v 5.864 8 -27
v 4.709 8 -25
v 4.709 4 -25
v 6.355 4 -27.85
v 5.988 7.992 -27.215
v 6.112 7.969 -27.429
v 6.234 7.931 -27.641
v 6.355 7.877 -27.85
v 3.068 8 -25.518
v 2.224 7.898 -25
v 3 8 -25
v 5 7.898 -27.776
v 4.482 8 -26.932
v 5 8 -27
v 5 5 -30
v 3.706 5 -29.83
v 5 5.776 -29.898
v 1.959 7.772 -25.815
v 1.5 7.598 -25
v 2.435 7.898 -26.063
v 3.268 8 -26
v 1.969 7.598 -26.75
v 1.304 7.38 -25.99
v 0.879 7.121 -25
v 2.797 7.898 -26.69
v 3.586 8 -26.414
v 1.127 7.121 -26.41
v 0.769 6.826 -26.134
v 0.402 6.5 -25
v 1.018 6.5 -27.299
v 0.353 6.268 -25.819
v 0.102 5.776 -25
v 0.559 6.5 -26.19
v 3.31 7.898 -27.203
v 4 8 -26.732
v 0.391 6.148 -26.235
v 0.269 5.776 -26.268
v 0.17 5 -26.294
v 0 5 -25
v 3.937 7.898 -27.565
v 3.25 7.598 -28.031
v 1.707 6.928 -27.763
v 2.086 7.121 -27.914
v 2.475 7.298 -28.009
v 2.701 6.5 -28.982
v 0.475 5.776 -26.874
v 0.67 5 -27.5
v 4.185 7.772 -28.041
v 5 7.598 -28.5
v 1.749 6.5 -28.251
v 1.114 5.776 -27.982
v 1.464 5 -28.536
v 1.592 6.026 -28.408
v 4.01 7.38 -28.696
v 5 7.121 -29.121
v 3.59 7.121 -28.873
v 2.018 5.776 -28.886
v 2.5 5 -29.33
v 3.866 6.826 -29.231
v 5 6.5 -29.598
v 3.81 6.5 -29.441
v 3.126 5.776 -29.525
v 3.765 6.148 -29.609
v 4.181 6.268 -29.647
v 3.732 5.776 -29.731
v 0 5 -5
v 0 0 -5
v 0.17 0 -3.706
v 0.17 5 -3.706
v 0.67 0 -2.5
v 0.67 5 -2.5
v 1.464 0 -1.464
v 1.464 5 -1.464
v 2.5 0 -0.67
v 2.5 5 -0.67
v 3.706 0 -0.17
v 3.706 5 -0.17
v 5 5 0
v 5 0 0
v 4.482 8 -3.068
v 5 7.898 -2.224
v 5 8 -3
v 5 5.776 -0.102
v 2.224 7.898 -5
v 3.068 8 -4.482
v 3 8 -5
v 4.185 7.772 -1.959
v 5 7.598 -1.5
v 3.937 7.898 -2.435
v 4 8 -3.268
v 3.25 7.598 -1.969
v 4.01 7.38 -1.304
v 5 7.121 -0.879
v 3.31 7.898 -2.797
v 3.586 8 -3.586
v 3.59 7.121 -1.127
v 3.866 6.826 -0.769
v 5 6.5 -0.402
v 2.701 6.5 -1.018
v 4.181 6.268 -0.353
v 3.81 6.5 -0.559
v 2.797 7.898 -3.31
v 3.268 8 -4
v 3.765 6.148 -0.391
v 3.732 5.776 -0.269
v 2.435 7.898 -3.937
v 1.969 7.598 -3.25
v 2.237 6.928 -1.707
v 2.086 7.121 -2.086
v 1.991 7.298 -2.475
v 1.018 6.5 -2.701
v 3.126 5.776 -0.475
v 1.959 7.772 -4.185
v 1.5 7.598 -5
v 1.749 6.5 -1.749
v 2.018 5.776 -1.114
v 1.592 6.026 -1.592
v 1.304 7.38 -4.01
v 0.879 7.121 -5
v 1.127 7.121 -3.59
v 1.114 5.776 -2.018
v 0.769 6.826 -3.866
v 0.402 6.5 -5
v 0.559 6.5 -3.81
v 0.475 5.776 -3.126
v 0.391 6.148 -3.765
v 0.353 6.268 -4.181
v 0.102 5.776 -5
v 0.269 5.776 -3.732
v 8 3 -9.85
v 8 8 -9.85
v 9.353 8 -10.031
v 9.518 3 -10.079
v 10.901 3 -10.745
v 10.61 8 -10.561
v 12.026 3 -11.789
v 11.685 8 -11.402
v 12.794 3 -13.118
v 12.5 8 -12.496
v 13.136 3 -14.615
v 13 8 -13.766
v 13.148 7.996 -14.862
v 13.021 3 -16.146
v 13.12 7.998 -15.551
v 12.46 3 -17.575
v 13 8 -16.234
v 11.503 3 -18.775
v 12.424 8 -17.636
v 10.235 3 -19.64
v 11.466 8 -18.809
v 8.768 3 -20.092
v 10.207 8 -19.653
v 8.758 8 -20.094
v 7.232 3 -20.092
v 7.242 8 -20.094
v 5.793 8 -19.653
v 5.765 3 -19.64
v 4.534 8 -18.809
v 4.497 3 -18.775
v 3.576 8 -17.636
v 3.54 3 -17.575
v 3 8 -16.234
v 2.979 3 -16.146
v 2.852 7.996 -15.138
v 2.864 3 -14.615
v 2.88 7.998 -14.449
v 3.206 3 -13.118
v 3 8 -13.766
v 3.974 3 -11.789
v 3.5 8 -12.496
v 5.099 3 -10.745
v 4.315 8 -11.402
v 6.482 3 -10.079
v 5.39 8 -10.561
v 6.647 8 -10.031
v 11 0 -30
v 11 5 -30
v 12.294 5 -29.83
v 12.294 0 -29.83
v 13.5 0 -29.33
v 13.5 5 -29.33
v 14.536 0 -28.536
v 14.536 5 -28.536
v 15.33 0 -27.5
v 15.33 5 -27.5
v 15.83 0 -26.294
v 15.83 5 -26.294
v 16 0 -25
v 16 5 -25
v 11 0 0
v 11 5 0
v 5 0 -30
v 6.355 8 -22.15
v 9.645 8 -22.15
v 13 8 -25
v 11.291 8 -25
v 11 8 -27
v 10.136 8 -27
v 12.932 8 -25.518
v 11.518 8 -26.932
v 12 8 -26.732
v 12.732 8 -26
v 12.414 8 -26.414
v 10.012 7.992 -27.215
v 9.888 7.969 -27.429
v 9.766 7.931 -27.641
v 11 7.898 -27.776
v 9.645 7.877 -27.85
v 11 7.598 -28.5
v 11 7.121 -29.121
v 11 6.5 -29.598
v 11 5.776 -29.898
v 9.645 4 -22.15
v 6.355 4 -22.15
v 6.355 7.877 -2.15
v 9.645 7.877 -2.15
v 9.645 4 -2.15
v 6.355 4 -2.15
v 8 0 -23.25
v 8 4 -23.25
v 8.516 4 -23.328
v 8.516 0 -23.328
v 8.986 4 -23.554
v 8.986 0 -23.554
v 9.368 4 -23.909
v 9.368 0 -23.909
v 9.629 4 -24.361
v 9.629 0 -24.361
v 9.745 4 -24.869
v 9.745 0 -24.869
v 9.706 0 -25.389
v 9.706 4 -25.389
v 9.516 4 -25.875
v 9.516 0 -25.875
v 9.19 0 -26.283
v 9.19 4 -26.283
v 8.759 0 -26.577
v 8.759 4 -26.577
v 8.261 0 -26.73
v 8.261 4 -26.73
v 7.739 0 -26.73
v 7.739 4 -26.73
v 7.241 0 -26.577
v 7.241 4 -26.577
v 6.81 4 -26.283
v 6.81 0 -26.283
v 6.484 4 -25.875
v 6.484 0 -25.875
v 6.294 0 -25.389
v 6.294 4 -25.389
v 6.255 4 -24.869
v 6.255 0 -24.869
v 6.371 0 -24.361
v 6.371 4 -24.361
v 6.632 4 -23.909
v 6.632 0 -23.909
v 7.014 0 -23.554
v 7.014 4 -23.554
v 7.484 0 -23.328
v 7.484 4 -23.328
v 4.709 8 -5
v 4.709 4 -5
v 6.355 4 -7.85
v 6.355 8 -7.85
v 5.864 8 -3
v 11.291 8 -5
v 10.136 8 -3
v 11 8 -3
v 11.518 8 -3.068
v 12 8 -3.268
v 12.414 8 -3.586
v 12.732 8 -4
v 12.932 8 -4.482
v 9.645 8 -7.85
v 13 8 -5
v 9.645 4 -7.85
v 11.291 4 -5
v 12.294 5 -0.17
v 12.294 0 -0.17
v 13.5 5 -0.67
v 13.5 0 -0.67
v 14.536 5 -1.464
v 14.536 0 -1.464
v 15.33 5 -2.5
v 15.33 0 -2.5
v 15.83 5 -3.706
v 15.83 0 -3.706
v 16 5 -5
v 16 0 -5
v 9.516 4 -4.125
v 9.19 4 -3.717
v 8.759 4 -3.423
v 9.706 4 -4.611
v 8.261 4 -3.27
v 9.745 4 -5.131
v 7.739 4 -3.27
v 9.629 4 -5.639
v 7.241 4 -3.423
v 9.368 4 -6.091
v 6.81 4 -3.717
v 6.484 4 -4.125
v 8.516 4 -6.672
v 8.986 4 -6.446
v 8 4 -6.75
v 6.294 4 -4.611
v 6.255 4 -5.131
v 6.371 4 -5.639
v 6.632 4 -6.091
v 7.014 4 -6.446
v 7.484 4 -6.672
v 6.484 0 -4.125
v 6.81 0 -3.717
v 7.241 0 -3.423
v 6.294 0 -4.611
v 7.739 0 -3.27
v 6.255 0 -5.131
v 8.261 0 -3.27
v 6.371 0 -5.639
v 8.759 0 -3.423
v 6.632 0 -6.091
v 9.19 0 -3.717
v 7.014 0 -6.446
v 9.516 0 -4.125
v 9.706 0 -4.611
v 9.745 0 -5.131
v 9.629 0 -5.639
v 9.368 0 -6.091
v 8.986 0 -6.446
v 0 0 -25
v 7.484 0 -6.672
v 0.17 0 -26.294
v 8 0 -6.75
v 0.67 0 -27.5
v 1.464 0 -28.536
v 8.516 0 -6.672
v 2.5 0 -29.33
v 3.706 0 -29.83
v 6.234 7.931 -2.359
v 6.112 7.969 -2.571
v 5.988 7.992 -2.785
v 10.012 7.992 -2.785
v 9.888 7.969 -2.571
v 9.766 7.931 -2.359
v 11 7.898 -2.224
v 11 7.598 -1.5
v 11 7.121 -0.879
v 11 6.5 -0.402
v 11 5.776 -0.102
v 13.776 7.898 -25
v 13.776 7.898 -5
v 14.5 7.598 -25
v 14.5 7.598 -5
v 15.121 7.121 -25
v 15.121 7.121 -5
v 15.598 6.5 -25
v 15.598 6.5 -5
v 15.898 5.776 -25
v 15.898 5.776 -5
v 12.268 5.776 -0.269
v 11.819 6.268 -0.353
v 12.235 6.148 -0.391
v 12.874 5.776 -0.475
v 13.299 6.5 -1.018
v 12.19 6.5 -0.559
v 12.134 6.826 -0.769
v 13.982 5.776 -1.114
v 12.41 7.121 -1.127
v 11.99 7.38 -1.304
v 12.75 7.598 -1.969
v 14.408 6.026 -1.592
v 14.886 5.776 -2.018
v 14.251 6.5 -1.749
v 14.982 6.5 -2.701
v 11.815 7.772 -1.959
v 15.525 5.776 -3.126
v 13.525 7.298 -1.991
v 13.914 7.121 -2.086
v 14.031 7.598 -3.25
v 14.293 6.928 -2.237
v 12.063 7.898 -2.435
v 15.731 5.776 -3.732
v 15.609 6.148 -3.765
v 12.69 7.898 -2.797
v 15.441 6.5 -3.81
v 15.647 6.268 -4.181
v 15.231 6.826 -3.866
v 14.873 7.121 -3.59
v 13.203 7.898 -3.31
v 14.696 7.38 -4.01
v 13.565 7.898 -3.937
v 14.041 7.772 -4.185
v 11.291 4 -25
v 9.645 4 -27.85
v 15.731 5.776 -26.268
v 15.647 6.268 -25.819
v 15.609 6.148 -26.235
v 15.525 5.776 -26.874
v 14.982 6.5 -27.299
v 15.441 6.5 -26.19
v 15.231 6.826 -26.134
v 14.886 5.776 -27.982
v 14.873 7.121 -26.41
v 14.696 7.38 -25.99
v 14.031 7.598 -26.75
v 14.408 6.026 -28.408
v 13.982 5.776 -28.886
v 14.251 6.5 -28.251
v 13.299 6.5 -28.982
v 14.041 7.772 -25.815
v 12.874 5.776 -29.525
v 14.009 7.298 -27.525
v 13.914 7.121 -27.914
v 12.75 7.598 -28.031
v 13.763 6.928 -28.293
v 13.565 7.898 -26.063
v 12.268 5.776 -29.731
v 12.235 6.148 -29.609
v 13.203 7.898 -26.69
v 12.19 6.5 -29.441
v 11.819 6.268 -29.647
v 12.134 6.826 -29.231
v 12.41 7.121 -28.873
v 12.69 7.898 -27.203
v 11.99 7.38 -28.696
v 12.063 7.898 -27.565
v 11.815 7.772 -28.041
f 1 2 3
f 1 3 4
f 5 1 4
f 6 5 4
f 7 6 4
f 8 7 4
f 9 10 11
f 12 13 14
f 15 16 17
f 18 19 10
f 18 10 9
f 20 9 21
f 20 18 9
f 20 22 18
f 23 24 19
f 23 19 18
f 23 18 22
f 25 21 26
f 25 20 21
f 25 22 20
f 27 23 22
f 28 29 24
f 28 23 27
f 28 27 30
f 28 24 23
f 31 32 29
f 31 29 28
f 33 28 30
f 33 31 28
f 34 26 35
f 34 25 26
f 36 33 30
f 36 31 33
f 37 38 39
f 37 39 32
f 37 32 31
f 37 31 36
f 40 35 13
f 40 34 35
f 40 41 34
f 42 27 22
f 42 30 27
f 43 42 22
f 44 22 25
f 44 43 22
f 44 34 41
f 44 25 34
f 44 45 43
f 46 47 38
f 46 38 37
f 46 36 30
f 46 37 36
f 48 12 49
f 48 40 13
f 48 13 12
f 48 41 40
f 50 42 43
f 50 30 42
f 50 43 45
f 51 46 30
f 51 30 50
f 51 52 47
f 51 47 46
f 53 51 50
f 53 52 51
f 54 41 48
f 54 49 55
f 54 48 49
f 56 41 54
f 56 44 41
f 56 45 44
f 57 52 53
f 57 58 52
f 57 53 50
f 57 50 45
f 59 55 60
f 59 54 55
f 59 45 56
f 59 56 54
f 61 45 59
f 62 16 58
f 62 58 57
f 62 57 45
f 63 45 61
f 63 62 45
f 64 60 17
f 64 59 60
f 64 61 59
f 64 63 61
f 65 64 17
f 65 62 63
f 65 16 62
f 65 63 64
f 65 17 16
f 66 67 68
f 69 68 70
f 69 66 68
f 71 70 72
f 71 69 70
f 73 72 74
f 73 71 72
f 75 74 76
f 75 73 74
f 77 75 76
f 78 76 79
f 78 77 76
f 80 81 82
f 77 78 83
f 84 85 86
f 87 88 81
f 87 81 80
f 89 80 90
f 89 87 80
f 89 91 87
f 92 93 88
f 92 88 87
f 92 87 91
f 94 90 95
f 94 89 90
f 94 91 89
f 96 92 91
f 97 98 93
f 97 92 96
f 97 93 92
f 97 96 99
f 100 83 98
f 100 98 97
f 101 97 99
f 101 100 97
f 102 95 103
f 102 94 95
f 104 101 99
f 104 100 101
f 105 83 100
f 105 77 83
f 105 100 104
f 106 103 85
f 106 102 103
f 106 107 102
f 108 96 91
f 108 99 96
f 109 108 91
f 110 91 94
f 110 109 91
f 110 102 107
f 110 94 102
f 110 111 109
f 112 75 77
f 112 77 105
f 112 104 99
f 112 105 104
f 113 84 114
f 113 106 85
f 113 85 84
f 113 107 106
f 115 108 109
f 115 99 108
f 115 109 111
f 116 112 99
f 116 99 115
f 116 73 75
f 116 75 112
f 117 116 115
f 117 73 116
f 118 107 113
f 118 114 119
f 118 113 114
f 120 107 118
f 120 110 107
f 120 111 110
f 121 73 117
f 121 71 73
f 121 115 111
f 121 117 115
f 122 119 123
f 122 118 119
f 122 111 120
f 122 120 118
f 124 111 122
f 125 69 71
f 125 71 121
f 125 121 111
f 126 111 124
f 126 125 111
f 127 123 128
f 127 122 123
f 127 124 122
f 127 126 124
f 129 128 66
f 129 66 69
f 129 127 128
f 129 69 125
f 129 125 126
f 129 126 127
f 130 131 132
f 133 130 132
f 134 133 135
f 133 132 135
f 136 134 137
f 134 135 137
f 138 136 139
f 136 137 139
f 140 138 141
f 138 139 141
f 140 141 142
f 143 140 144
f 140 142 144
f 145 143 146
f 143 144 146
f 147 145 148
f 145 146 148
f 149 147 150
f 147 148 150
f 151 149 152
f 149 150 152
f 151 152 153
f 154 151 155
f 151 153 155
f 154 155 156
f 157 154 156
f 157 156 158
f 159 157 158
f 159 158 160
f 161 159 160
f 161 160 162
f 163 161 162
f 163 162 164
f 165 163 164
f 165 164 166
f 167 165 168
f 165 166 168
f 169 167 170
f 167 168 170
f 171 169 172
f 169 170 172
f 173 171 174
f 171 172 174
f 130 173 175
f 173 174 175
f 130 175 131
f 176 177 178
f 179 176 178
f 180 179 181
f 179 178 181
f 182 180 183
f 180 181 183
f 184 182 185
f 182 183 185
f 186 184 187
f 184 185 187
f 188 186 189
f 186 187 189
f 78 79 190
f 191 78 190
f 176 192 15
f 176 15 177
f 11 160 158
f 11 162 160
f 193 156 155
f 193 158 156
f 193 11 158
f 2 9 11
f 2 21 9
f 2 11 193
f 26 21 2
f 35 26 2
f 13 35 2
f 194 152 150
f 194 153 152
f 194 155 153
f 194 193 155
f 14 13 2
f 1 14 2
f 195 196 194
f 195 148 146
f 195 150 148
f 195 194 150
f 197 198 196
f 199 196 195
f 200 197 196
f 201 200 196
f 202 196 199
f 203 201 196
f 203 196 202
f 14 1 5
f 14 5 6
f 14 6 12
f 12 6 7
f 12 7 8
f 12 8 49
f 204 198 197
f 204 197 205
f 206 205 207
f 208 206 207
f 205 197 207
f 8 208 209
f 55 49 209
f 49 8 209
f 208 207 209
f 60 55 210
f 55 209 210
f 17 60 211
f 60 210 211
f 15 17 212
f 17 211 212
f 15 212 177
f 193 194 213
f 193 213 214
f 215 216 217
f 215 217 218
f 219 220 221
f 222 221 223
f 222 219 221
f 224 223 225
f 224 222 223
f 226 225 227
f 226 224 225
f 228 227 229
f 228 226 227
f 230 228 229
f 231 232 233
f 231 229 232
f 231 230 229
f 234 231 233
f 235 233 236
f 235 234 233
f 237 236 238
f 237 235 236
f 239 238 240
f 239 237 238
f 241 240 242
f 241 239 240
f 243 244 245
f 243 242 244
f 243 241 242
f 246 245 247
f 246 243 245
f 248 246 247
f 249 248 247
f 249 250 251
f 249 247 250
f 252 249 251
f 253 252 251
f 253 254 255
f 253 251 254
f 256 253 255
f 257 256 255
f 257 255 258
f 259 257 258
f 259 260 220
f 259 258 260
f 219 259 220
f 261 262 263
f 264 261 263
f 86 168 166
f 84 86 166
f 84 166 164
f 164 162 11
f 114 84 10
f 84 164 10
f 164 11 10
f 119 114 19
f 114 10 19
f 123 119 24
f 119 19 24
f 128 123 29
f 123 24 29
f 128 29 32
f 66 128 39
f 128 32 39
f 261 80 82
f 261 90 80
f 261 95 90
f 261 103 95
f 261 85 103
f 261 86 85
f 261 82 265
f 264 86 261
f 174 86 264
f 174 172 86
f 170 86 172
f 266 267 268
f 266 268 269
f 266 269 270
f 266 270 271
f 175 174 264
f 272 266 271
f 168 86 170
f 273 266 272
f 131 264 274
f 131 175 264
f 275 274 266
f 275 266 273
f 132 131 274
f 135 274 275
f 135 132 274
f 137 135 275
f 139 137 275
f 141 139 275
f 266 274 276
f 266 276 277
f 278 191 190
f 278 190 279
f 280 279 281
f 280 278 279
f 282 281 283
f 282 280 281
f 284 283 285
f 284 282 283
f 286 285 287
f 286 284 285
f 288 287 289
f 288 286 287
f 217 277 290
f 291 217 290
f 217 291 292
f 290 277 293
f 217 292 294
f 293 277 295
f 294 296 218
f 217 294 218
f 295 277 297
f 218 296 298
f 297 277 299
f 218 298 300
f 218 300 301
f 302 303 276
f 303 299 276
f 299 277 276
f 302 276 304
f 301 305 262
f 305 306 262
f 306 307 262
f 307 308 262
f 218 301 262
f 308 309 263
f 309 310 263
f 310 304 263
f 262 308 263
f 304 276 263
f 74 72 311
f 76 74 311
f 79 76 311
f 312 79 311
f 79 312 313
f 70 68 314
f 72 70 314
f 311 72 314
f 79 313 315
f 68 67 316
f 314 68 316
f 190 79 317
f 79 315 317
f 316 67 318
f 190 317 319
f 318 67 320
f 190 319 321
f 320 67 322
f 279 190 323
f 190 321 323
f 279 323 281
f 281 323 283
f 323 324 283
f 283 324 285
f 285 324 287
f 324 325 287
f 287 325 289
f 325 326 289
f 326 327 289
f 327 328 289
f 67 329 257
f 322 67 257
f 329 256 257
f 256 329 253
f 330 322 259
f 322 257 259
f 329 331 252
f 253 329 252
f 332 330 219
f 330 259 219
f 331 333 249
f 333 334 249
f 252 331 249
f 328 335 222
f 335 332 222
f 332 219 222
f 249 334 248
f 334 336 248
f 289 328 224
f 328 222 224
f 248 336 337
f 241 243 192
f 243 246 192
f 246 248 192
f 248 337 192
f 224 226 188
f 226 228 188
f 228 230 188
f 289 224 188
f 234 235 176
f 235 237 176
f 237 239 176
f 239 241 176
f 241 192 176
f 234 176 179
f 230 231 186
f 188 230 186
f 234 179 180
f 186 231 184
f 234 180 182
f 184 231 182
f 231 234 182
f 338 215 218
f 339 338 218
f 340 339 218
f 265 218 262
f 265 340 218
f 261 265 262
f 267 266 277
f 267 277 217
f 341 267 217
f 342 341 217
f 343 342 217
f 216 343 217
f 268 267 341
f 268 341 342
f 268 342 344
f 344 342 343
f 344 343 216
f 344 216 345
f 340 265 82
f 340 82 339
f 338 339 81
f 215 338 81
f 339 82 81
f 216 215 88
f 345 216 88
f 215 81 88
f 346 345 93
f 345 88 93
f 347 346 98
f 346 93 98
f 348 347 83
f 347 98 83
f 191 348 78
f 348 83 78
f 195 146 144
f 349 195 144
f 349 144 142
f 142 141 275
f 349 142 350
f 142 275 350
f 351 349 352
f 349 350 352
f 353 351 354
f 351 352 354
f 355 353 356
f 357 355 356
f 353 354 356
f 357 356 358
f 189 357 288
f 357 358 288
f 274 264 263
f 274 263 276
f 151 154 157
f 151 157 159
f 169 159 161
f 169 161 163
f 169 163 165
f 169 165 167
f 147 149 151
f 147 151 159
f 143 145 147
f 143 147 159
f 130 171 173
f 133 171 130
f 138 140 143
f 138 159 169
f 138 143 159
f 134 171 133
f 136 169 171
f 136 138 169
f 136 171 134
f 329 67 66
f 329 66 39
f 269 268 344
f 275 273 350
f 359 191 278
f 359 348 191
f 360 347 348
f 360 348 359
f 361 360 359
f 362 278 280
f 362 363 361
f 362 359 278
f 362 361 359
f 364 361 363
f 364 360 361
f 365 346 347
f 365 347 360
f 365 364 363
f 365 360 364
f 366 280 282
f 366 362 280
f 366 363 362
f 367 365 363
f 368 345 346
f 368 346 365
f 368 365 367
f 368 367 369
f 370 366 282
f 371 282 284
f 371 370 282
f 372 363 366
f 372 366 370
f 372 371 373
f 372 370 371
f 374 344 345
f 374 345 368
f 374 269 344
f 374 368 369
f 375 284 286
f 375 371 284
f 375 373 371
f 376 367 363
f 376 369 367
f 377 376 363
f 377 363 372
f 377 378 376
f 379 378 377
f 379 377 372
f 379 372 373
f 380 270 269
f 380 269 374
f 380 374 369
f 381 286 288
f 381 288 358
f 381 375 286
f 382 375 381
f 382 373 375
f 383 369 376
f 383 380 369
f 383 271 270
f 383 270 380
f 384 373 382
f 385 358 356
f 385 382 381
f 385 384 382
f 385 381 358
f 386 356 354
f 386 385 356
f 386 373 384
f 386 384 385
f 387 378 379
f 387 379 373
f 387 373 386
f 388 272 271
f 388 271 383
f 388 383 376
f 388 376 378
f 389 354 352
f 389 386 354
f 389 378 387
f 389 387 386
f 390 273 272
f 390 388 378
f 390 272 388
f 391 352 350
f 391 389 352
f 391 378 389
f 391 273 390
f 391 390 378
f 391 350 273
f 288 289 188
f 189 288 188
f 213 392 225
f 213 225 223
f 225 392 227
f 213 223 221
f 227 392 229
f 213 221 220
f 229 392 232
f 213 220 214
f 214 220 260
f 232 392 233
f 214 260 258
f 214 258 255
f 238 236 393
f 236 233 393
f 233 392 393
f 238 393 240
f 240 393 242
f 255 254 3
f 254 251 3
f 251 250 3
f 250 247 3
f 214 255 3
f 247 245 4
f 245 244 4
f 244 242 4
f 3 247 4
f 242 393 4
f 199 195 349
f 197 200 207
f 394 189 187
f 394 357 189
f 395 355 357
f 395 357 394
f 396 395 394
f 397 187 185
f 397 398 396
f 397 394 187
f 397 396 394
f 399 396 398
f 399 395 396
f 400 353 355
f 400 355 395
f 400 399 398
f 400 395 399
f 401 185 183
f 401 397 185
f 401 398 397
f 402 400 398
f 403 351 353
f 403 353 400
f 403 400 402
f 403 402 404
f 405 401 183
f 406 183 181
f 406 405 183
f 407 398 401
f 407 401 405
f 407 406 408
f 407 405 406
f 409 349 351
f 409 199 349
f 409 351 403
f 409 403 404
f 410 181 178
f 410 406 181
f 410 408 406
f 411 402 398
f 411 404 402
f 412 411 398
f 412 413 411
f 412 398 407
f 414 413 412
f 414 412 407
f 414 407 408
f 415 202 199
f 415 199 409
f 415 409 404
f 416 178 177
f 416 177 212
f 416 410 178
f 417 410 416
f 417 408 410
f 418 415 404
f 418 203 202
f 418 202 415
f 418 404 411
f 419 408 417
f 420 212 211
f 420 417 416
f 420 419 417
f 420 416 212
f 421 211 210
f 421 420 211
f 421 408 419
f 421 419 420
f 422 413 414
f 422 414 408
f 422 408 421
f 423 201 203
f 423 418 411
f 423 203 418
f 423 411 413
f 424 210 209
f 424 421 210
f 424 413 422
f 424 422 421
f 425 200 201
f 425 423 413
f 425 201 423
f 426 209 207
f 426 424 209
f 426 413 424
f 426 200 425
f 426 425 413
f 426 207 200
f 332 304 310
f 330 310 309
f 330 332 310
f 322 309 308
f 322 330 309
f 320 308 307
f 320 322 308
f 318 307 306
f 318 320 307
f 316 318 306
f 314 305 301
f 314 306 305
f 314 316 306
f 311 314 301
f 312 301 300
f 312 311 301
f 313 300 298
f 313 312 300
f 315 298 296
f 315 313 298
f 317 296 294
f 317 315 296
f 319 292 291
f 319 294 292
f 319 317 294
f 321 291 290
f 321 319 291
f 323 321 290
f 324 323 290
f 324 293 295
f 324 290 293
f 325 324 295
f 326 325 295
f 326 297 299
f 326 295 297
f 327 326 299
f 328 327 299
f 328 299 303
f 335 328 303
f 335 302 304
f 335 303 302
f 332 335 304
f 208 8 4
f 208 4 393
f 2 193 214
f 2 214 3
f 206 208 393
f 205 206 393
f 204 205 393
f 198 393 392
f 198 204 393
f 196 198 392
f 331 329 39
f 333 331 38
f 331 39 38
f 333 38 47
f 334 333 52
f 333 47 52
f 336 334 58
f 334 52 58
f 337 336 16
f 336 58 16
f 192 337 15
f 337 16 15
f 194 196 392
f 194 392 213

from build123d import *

# Parameters (mm, degrees)
ESQUISSE1_W             = 16
ESQUISSE1_H             = 30
ESQUISSE1_R             = 1.75
BOSS_EXTRU_1_DEPTH      = 8
ESQUISSE2_R             = 5.15
ENL_V_MAT_EXTRU_1_DEPTH = 5
CONG_1_R                = 5
ENL_V_MAT_EXTRU_2_DEPTH = 4
CONG_2_R                = 3


with BuildPart() as part:
    # Esquisse1 → Boss.-Extru.1 (new body)
    with BuildSketch(Plane(origin=(0, 0, 0), x_dir=(1, 0, 0), z_dir=(0, 1, 0))):
        with Locations((8, 15)):
            Rectangle(ESQUISSE1_W, ESQUISSE1_H)
        with Locations(Location((8, 25, 0), (0, 0, 270))):
            Circle(ESQUISSE1_R, mode=Mode.SUBTRACT)
        with Locations(Location((8, 5, 0), (0, 0, 90))):
            Circle(ESQUISSE1_R, mode=Mode.SUBTRACT)
    extrude(amount=BOSS_EXTRU_1_DEPTH)

    # Esquisse2 → Enlèv. mat.-Extru.1 (cut)
    with BuildSketch(Plane(origin=(0, 8, 0), x_dir=(1, 0, 0), z_dir=(0, 1, 0))):
        with Locations(Location((8, 15, 0), (0, 0, 270))):
            Circle(ESQUISSE2_R)
    extrude(amount=-ENL_V_MAT_EXTRU_1_DEPTH, mode=Mode.SUBTRACT)

    # Congé1
    cong_1_edges = [part.edges().sort_by_distance(p)[0] for p in [
        (0, 4, -30),
        (16, 4, -30),
        (16, 4, 0),
        (0, 4, 0),
    ]]
    fillet(cong_1_edges, radius=CONG_1_R)

    # Esquisse3 → Enlèv. mat.-Extru.2 (cut)
    with BuildSketch(Plane(origin=(0, 8, 0), x_dir=(1, 0, 0), z_dir=(0, 1, 0))):
        Polygon((6.354551733, 27.85), (9.645448267, 27.85), (11.290896534, 25), (9.645448267, 22.15), (6.354551733, 22.15), (4.709103466, 25), align=None)
        Polygon((6.354551733, 7.85), (9.645448267, 7.85), (11.290896534, 5), (9.645448267, 2.15), (6.354551733, 2.15), (4.709103466, 5), align=None)
    extrude(amount=-ENL_V_MAT_EXTRU_2_DEPTH, mode=Mode.SUBTRACT)

    # Congé2
    # the kernel refuses this fillet: 3 mm, written as the material it takes off along each edge
    with BuildSketch(Plane(origin=(5, 8, -5), x_dir=(0, 0, 1), z_dir=(1, 0, 0))) as cong_2_piece_1:
        with BuildLine():
            CenterArc((5 - CONG_2_R, CONG_2_R), CONG_2_R, 270, 90)
            Line((5 - CONG_2_R, 0), (5, 0))
            Line((5, 0), (5, CONG_2_R))
        make_face()
    revolve(axis=Axis((5, 8, -5), (0, -1, 0)), revolution_arc=90, mode=Mode.SUBTRACT)
    with BuildSketch(Plane(origin=(0, 8, -25), x_dir=(1, 0, 0), z_dir=(0, 0, 1)), Plane(origin=(16, 8, -5), x_dir=(-1, 0, 0), z_dir=(0, 0, -1))) as cong_2_piece_2:
        with BuildLine():
            CenterArc((CONG_2_R, -CONG_2_R), CONG_2_R, 90, 90)
            Line((0, -CONG_2_R), (0, 0))
            Line((0, 0), (CONG_2_R, 0))
        make_face()
    extrude(amount=20, mode=Mode.SUBTRACT)
    with BuildSketch(Plane(origin=(5, 8, -25), x_dir=(-1, 0, 0), z_dir=(0, 0, 1))) as cong_2_piece_3:
        with BuildLine():
            CenterArc((5 - CONG_2_R, CONG_2_R), CONG_2_R, 270, 90)
            Line((5, CONG_2_R), (5, 0))
            Line((5, 0), (5 - CONG_2_R, 0))
        make_face()
    revolve(axis=Axis((5, 8, -25), (0, -1, 0)), revolution_arc=90, mode=Mode.SUBTRACT)
    with BuildSketch(Plane(origin=(11, 8, -30), x_dir=(0, 0, 1), z_dir=(-1, 0, 0))) as cong_2_piece_4:
        with BuildLine():
            CenterArc((CONG_2_R, -CONG_2_R), CONG_2_R, 90, 90)
            Line((0, -CONG_2_R), (0, 0))
            Line((0, 0), (CONG_2_R, 0))
        make_face()
    extrude(amount=6, mode=Mode.SUBTRACT)
    with BuildSketch(Plane(origin=(11, 8, -25), x_dir=(1, 0, 0), z_dir=(0, 0, 1))) as cong_2_piece_5:
        with BuildLine():
            CenterArc((5 - CONG_2_R, -CONG_2_R), CONG_2_R, 0, 90)
            Line((5, -CONG_2_R), (5, 0))
            Line((5, 0), (5 - CONG_2_R, 0))
        make_face()
    revolve(axis=Axis((11, 8, -25), (0, 1, 0)), revolution_arc=90, mode=Mode.SUBTRACT)
    with BuildSketch(Plane(origin=(11, 8, -5), x_dir=(0, 0, 1), z_dir=(-1, 0, 0))) as cong_2_piece_6:
        with BuildLine():
            CenterArc((5 - CONG_2_R, -CONG_2_R), CONG_2_R, 0, 90)
            Line((5 - CONG_2_R, 0), (5, 0))
            Line((5, 0), (5, -CONG_2_R))
        make_face()
    revolve(axis=Axis((11, 8, -5), (0, 1, 0)), revolution_arc=90, mode=Mode.SUBTRACT)
    with BuildSketch(Plane(origin=(5, 8, 0), x_dir=(0, -1, 0), z_dir=(1, 0, 0))) as cong_2_piece_7:
        with BuildLine():
            CenterArc((CONG_2_R, CONG_2_R), CONG_2_R, 180, 90)
            Line((0, CONG_2_R), (0, 0))
            Line((0, 0), (CONG_2_R, 0))
        make_face()
    extrude(amount=6, mode=Mode.SUBTRACT)


solid = part.part
